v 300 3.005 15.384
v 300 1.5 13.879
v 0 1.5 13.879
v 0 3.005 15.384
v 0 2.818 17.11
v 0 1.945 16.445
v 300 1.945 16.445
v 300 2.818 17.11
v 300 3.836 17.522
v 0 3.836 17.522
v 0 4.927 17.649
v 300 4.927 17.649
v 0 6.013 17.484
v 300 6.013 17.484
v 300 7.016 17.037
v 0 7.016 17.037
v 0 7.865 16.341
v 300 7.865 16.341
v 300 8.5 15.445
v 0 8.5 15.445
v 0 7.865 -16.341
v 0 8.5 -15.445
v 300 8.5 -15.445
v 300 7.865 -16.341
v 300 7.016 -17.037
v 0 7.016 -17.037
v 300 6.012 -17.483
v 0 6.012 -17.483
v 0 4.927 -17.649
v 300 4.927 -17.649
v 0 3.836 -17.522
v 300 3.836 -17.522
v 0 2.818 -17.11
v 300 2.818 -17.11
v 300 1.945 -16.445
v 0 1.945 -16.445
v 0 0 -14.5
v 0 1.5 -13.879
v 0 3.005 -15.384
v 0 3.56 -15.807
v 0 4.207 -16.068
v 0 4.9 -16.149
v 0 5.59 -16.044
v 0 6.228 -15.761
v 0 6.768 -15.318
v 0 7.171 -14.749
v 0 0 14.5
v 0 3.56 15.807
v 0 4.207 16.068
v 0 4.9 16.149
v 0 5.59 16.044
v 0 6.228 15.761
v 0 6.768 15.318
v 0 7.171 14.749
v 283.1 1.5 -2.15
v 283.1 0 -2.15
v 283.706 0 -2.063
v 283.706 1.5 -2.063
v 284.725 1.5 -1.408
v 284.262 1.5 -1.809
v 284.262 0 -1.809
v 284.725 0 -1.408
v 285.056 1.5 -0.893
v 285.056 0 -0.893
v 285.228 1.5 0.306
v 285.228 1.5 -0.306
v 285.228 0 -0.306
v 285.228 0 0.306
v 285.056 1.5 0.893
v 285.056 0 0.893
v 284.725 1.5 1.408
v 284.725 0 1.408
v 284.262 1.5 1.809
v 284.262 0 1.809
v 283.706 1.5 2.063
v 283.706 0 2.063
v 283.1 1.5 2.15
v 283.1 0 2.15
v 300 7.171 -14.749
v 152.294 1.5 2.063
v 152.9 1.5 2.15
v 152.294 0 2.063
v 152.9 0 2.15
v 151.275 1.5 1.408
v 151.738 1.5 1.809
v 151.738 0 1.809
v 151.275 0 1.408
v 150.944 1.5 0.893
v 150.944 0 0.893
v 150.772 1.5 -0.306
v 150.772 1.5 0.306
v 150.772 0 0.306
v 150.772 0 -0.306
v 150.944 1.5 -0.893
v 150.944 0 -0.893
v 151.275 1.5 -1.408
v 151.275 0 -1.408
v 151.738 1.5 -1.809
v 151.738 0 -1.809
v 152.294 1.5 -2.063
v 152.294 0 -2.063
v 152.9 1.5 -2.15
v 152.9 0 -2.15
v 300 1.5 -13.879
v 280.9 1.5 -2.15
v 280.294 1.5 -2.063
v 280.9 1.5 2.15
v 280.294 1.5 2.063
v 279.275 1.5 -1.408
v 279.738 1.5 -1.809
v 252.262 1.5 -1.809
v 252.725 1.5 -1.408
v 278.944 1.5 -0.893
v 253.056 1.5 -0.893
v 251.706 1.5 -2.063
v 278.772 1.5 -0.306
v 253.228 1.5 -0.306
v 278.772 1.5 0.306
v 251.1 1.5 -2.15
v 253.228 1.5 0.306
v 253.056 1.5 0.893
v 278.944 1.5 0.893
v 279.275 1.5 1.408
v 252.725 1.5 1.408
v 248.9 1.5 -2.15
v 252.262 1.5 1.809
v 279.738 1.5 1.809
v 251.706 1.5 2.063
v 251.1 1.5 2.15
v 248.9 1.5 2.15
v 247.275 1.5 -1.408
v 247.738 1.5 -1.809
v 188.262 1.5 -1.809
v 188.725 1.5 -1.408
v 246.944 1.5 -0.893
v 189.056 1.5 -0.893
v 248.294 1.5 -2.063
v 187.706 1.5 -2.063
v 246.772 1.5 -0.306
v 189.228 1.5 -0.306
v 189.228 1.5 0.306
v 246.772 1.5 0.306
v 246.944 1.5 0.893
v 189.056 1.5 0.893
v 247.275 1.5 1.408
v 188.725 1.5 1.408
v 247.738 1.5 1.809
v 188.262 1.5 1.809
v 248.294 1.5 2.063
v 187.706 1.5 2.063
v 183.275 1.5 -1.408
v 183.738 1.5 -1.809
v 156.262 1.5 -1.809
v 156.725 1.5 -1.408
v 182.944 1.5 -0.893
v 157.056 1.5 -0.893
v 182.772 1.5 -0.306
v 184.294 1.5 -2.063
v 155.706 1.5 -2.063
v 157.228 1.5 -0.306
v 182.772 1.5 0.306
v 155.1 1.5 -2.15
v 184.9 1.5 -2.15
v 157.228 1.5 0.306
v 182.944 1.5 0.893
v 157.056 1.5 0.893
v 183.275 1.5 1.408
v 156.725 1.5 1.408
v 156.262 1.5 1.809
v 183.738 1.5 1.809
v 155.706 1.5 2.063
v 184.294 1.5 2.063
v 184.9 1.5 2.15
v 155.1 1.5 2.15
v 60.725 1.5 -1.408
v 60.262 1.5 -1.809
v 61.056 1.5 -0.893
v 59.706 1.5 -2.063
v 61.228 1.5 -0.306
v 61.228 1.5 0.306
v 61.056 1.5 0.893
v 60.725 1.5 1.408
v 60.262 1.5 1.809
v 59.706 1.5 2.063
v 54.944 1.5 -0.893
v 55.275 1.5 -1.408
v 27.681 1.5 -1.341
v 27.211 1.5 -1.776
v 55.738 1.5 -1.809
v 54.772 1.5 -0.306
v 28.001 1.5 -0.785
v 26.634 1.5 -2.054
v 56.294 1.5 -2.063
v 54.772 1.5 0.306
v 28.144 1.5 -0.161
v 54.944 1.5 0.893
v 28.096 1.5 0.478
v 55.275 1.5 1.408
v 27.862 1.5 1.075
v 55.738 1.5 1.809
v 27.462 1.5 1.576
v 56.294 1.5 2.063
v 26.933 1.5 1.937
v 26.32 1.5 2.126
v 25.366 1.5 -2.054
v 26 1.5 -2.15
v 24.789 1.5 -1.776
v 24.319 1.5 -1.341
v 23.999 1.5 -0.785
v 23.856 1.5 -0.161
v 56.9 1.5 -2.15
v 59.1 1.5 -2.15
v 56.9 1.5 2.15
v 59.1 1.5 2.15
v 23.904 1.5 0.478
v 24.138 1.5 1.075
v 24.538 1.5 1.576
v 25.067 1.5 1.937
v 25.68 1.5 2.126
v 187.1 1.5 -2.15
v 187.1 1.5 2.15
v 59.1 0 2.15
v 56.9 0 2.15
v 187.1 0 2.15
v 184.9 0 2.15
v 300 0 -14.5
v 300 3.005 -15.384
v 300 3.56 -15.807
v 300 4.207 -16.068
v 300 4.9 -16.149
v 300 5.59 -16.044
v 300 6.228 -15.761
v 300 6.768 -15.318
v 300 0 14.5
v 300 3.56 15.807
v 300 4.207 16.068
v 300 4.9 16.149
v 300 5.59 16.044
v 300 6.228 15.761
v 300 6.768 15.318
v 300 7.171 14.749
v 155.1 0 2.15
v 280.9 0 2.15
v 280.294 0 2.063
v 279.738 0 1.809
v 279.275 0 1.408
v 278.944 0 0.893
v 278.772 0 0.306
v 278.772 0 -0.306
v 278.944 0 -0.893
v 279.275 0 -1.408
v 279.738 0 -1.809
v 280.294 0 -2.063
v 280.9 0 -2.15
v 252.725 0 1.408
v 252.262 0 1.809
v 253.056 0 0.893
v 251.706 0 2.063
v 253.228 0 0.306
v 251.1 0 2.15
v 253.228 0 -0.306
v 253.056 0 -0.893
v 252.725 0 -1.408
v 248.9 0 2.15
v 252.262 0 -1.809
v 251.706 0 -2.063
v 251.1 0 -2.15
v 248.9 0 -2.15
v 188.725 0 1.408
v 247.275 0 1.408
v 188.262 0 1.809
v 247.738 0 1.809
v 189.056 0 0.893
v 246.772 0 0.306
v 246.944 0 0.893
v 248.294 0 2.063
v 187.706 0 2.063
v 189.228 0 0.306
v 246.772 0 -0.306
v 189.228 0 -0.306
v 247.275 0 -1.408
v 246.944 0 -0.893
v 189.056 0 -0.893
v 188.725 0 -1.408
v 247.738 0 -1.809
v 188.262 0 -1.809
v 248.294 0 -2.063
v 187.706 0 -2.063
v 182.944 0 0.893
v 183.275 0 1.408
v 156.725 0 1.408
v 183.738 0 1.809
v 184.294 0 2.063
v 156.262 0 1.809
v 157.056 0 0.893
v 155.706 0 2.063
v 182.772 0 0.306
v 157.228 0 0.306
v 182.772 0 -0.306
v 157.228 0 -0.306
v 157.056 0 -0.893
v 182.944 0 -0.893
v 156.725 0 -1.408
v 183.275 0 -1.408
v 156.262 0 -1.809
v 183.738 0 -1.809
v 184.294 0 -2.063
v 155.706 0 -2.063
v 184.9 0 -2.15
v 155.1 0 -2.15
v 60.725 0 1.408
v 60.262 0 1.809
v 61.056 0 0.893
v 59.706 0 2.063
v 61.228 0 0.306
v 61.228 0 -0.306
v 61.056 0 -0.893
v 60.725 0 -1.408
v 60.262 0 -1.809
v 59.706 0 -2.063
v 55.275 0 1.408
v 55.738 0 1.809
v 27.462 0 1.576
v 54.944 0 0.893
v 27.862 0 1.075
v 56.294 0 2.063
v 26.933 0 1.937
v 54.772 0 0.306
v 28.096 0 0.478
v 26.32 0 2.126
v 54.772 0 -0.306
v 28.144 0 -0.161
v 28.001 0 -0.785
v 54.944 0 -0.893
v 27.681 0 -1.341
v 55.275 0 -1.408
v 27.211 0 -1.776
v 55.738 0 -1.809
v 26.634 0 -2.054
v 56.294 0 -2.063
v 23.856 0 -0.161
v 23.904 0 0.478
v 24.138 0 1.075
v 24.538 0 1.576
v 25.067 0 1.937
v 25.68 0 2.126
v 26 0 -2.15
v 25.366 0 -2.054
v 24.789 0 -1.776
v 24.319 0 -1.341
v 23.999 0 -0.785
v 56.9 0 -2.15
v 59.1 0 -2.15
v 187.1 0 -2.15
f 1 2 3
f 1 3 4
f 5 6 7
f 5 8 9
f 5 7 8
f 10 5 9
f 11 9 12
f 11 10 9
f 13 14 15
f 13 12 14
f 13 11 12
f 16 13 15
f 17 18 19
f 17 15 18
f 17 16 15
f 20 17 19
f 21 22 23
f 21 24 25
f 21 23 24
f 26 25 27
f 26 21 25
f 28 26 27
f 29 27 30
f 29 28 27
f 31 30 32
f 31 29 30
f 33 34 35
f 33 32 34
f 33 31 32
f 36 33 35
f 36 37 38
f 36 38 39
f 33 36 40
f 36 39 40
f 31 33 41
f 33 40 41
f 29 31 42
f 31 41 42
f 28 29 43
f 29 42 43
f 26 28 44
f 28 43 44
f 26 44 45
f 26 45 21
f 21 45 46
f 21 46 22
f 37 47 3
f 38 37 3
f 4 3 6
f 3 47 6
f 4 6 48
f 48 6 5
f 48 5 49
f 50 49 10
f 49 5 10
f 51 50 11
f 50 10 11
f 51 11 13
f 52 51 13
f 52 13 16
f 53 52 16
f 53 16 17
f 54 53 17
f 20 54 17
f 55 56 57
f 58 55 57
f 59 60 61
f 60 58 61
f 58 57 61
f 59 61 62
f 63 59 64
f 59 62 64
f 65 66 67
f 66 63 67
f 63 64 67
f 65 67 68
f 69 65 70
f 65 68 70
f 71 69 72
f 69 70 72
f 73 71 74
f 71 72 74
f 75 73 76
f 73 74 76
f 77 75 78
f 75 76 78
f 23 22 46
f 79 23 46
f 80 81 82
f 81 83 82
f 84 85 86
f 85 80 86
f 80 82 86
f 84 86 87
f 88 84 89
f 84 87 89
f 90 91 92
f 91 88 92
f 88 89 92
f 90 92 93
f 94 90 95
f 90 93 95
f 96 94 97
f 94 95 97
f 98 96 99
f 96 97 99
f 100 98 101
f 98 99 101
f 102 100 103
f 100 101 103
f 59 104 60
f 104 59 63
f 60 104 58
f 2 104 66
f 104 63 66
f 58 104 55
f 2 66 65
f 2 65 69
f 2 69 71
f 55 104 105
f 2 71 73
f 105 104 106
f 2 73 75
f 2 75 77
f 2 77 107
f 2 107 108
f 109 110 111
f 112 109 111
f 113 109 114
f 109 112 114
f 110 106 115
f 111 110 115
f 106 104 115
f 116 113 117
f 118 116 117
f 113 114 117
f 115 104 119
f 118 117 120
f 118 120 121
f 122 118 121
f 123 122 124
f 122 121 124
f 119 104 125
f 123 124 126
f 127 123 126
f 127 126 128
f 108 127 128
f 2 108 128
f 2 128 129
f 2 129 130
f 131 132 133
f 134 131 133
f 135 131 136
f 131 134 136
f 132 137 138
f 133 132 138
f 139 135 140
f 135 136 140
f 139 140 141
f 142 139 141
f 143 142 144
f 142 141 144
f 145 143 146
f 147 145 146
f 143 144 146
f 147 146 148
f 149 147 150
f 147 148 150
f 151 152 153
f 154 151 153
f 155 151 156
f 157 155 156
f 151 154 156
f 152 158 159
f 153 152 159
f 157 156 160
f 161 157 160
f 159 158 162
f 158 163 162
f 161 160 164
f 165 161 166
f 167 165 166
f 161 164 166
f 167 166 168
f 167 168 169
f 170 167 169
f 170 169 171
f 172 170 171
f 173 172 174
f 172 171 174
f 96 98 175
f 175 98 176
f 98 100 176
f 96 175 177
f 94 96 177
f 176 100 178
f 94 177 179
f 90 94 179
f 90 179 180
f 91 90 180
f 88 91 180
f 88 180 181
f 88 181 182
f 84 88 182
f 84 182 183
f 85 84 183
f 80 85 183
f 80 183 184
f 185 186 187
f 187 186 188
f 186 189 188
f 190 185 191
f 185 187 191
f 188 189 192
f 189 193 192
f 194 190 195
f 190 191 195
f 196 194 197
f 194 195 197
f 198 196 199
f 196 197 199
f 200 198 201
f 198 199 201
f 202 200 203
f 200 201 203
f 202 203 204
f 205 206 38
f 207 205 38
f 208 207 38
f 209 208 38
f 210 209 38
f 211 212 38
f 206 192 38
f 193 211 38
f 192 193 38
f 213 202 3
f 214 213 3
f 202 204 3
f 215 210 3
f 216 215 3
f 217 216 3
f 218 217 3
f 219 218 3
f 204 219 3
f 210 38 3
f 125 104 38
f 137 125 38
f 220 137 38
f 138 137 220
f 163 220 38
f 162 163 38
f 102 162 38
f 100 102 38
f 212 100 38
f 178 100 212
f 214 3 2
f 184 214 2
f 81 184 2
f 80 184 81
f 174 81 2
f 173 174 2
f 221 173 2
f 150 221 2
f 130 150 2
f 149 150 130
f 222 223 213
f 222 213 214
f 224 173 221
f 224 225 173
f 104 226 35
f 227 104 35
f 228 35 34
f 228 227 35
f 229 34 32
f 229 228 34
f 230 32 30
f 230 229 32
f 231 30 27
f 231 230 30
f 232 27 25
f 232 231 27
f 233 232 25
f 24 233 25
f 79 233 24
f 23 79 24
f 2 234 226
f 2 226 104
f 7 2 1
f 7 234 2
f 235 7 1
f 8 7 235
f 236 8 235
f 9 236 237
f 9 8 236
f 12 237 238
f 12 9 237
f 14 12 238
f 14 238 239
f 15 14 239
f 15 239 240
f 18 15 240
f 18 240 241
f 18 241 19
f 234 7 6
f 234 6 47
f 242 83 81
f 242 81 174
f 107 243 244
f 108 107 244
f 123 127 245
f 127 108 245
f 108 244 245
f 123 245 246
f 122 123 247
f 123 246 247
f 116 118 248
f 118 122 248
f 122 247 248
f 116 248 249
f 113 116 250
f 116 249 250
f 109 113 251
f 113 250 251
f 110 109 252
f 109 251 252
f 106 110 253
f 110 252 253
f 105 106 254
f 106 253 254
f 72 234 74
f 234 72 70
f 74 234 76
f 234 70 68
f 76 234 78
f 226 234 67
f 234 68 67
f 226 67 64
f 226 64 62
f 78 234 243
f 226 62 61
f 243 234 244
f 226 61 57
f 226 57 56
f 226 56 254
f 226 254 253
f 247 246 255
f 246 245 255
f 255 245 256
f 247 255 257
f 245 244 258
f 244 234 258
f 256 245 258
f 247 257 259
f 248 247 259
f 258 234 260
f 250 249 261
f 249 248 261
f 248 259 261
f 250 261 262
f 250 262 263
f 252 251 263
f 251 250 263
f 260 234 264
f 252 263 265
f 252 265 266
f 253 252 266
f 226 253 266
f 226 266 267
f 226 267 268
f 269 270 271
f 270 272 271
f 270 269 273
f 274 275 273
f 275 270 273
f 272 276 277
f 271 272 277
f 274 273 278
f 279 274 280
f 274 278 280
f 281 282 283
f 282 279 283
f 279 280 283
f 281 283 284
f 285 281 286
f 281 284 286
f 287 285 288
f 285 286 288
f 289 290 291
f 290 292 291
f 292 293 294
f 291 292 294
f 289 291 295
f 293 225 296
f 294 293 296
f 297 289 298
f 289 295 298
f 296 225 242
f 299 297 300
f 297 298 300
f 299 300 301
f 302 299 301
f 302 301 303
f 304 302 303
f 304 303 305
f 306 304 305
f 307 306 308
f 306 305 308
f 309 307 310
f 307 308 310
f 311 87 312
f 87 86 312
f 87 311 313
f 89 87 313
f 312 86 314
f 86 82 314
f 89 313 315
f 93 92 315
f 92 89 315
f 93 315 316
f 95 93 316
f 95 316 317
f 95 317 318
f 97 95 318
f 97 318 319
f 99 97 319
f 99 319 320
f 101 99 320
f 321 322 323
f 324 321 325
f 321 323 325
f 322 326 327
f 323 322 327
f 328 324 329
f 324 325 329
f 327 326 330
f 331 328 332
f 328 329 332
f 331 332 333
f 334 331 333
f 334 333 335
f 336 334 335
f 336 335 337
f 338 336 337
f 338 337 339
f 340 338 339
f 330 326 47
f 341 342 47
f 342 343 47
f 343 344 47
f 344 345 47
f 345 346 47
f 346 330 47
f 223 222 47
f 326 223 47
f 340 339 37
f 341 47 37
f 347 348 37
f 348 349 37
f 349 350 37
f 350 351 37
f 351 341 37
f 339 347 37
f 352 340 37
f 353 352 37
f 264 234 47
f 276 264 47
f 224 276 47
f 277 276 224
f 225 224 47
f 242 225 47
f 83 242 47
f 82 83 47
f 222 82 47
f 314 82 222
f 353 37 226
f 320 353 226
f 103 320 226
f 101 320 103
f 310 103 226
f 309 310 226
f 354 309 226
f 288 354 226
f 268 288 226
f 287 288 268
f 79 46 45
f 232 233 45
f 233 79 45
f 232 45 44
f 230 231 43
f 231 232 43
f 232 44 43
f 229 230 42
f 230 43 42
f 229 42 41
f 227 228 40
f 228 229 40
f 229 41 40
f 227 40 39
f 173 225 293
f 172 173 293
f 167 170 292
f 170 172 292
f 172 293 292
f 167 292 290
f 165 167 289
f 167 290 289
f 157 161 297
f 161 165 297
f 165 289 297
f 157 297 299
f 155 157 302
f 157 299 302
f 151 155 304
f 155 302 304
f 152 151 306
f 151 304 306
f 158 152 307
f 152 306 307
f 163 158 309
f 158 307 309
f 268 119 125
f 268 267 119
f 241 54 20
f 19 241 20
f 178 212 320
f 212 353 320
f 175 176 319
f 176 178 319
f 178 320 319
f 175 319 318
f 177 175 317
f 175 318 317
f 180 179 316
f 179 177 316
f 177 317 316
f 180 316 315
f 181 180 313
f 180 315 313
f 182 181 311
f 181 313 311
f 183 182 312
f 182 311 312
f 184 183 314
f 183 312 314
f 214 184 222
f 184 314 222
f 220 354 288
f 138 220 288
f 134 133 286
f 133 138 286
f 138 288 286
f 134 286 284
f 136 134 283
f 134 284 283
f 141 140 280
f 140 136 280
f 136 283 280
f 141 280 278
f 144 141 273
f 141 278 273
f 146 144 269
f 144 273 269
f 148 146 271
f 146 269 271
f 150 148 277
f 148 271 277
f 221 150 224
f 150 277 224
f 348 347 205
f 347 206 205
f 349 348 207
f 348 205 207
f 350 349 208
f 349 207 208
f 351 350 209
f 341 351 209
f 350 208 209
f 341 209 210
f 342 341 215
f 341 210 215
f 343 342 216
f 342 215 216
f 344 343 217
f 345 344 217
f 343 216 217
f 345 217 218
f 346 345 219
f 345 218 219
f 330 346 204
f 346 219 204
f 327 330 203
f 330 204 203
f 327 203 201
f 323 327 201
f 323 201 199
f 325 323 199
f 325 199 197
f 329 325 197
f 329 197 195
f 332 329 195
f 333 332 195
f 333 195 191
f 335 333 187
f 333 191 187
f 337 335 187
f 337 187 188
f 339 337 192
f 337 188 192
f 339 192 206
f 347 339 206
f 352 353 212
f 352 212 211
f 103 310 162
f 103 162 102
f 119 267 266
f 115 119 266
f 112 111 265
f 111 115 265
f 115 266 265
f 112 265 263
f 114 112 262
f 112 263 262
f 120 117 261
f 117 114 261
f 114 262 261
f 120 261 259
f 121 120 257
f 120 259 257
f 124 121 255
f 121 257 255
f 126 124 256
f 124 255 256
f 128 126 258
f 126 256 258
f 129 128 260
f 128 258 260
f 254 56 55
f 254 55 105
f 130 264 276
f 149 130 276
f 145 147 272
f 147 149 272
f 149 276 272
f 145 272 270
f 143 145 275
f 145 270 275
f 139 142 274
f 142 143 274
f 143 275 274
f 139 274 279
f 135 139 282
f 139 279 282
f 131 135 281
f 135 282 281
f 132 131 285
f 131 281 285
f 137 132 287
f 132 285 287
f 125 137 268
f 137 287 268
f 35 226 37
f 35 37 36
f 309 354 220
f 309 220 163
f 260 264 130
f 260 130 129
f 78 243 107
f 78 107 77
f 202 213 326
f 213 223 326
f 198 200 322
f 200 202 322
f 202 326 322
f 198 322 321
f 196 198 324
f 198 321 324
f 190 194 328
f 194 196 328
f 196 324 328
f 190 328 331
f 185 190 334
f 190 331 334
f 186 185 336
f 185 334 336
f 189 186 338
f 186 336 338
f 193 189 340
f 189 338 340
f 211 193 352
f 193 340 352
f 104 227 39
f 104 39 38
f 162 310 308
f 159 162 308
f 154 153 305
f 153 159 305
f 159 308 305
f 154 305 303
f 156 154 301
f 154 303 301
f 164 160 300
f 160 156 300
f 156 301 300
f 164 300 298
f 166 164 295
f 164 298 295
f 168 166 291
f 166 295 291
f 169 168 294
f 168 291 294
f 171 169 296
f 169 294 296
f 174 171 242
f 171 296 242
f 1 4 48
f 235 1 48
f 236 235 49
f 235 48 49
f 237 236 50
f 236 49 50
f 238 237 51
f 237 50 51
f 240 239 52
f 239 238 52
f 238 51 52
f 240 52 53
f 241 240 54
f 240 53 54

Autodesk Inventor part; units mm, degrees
sketch "Esquisse_1" plane through (0, 0, 0) normal (1, 0, 0) x (0, 1, 0)
  arc A0 (8.5002, 15.4448) -> (1.9449, 16.4446) centre (4.8548, 13.5338) ccw
  line L0 (1.9449, 16.4446) -> (0, 14.5)
  line L1 (0, 14.5) -> (0, -14.5)
  line L2 (0, -14.5) -> (1.9449, -16.4446)
  arc A1 (1.9449, -16.4446) -> (8.5001, -15.4451) centre (4.8548, -13.5338) ccw
  line L3 (8.5001, -15.4451) -> (7.1713, -14.7492)
  arc A2 (3.0052, -15.3838) -> (7.1713, -14.7492) centre (4.8548, -13.5337) ccw
  line L4 (3.0052, -15.3838) -> (1.5, -13.879)
  line L5 (1.5, -13.879) -> (1.5, 13.879)
  line L6 (1.5, 13.879) -> (3.0052, 15.3838)
  arc A3 (7.1713, 14.7492) -> (3.0052, 15.3838) centre (4.8548, 13.5337) ccw
  line L7 (7.1713, 14.7492) -> (8.5002, 15.4448)
extrude "Extrusion1" add sketch "Esquisse_1" along normal blind 300
sketch "Sketch2" plane through (0, 0, -14.5) normal (0, -1, 0) x (1, 0, 0)
  point P0 (26, 14.5)
hole "Drilling 1" at (26, 0, 0) direction (0, 1, 0) diameter 4.3 depth 1.5
sketch "Esquisse_3" plane through (0, 0, 0) normal (0, 1, 0) x (-1, 0, 0)
  arc A0 (-56.9, -2.15) -> (-56.9, 2.15) centre (-56.9, 0) ccw
  line L0 (-56.9, 2.15) -> (-59.1, 2.15)
  arc A1 (-59.1, 2.15) -> (-59.1, -2.15) centre (-59.1, 0) ccw
  line L1 (-59.1, -2.15) -> (-56.9, -2.15)
extrude "Extrusion2" cut sketch "Esquisse_3" along normal blind 1.5
sketch "Esquisse_4" plane through (0, 0, 0) normal (0, 1, 0) x (-1, 0, 0)
  arc A0 (-152.9, -2.15) -> (-152.9, 2.15) centre (-152.9, 0) ccw
  line L0 (-152.9, 2.15) -> (-155.1, 2.15)
  arc A1 (-155.1, 2.15) -> (-155.1, -2.15) centre (-155.1, 0) ccw
  line L1 (-155.1, -2.15) -> (-152.9, -2.15)
extrude "Extrusion3" cut sketch "Esquisse_4" along normal blind 1.5
sketch "Esquisse_5" plane through (0, 0, 0) normal (0, 1, 0) x (-1, 0, 0)
  arc A0 (-184.9, -2.15) -> (-184.9, 2.15) centre (-184.9, 0) ccw
  line L0 (-184.9, 2.15) -> (-187.1, 2.15)
  arc A1 (-187.1, 2.15) -> (-187.1, -2.15) centre (-187.1, 0) ccw
  line L1 (-187.1, -2.15) -> (-184.9, -2.15)
extrude "Extrusion4" cut sketch "Esquisse_5" along normal blind 1.5
sketch "Esquisse_6" plane through (0, 0, 0) normal (0, 1, 0) x (-1, 0, 0)
  arc A0 (-248.9, -2.15) -> (-248.9, 2.15) centre (-248.9, 0) ccw
  line L0 (-248.9, 2.15) -> (-251.1, 2.15)
  arc A1 (-251.1, 2.15) -> (-251.1, -2.15) centre (-251.1, 0) ccw
  line L1 (-251.1, -2.15) -> (-248.9, -2.15)
extrude "Extrusion5" cut sketch "Esquisse_6" along normal blind 1.5
sketch "Esquisse_7" plane through (0, 0, 0) normal (0, 1, 0) x (-1, 0, 0)
  arc A0 (-280.9, -2.15) -> (-280.9, 2.15) centre (-280.9, 0) ccw
  line L0 (-280.9, 2.15) -> (-283.1, 2.15)
  arc A1 (-283.1, 2.15) -> (-283.1, -2.15) centre (-283.1, 0) ccw
  line L1 (-283.1, -2.15) -> (-280.9, -2.15)
extrude "Extrusion6" cut sketch "Esquisse_7" along normal blind 1.5
ref_plane "IP0_XY" through (0, 0, 0) normal (-1, 0, 0) x (0, 0, -1)
ref_plane "IP0_YZ" through (0, 0, 0) normal (0, 0, -1) x (0, -1, 0)
ref_plane "IP0_ZX" through (0, 0, 0) normal (0, -1, 0) x (-1, 0, 0)
ref_plane "IP1_XY" through (2.5, 0, 0) normal (1, 0, 0) x (0, 0, -1)
ref_plane "IP1_YZ" through (2.5, 0, 0) normal (0, 0, -1) x (0, 1, 0)
ref_plane "IP1_ZX" through (2.5, 0, 0) normal (0, 1, 0) x (1, 0, 0)
properties part number "MICHAUD CHAILLY B3 - 21 - 30 - 1"
